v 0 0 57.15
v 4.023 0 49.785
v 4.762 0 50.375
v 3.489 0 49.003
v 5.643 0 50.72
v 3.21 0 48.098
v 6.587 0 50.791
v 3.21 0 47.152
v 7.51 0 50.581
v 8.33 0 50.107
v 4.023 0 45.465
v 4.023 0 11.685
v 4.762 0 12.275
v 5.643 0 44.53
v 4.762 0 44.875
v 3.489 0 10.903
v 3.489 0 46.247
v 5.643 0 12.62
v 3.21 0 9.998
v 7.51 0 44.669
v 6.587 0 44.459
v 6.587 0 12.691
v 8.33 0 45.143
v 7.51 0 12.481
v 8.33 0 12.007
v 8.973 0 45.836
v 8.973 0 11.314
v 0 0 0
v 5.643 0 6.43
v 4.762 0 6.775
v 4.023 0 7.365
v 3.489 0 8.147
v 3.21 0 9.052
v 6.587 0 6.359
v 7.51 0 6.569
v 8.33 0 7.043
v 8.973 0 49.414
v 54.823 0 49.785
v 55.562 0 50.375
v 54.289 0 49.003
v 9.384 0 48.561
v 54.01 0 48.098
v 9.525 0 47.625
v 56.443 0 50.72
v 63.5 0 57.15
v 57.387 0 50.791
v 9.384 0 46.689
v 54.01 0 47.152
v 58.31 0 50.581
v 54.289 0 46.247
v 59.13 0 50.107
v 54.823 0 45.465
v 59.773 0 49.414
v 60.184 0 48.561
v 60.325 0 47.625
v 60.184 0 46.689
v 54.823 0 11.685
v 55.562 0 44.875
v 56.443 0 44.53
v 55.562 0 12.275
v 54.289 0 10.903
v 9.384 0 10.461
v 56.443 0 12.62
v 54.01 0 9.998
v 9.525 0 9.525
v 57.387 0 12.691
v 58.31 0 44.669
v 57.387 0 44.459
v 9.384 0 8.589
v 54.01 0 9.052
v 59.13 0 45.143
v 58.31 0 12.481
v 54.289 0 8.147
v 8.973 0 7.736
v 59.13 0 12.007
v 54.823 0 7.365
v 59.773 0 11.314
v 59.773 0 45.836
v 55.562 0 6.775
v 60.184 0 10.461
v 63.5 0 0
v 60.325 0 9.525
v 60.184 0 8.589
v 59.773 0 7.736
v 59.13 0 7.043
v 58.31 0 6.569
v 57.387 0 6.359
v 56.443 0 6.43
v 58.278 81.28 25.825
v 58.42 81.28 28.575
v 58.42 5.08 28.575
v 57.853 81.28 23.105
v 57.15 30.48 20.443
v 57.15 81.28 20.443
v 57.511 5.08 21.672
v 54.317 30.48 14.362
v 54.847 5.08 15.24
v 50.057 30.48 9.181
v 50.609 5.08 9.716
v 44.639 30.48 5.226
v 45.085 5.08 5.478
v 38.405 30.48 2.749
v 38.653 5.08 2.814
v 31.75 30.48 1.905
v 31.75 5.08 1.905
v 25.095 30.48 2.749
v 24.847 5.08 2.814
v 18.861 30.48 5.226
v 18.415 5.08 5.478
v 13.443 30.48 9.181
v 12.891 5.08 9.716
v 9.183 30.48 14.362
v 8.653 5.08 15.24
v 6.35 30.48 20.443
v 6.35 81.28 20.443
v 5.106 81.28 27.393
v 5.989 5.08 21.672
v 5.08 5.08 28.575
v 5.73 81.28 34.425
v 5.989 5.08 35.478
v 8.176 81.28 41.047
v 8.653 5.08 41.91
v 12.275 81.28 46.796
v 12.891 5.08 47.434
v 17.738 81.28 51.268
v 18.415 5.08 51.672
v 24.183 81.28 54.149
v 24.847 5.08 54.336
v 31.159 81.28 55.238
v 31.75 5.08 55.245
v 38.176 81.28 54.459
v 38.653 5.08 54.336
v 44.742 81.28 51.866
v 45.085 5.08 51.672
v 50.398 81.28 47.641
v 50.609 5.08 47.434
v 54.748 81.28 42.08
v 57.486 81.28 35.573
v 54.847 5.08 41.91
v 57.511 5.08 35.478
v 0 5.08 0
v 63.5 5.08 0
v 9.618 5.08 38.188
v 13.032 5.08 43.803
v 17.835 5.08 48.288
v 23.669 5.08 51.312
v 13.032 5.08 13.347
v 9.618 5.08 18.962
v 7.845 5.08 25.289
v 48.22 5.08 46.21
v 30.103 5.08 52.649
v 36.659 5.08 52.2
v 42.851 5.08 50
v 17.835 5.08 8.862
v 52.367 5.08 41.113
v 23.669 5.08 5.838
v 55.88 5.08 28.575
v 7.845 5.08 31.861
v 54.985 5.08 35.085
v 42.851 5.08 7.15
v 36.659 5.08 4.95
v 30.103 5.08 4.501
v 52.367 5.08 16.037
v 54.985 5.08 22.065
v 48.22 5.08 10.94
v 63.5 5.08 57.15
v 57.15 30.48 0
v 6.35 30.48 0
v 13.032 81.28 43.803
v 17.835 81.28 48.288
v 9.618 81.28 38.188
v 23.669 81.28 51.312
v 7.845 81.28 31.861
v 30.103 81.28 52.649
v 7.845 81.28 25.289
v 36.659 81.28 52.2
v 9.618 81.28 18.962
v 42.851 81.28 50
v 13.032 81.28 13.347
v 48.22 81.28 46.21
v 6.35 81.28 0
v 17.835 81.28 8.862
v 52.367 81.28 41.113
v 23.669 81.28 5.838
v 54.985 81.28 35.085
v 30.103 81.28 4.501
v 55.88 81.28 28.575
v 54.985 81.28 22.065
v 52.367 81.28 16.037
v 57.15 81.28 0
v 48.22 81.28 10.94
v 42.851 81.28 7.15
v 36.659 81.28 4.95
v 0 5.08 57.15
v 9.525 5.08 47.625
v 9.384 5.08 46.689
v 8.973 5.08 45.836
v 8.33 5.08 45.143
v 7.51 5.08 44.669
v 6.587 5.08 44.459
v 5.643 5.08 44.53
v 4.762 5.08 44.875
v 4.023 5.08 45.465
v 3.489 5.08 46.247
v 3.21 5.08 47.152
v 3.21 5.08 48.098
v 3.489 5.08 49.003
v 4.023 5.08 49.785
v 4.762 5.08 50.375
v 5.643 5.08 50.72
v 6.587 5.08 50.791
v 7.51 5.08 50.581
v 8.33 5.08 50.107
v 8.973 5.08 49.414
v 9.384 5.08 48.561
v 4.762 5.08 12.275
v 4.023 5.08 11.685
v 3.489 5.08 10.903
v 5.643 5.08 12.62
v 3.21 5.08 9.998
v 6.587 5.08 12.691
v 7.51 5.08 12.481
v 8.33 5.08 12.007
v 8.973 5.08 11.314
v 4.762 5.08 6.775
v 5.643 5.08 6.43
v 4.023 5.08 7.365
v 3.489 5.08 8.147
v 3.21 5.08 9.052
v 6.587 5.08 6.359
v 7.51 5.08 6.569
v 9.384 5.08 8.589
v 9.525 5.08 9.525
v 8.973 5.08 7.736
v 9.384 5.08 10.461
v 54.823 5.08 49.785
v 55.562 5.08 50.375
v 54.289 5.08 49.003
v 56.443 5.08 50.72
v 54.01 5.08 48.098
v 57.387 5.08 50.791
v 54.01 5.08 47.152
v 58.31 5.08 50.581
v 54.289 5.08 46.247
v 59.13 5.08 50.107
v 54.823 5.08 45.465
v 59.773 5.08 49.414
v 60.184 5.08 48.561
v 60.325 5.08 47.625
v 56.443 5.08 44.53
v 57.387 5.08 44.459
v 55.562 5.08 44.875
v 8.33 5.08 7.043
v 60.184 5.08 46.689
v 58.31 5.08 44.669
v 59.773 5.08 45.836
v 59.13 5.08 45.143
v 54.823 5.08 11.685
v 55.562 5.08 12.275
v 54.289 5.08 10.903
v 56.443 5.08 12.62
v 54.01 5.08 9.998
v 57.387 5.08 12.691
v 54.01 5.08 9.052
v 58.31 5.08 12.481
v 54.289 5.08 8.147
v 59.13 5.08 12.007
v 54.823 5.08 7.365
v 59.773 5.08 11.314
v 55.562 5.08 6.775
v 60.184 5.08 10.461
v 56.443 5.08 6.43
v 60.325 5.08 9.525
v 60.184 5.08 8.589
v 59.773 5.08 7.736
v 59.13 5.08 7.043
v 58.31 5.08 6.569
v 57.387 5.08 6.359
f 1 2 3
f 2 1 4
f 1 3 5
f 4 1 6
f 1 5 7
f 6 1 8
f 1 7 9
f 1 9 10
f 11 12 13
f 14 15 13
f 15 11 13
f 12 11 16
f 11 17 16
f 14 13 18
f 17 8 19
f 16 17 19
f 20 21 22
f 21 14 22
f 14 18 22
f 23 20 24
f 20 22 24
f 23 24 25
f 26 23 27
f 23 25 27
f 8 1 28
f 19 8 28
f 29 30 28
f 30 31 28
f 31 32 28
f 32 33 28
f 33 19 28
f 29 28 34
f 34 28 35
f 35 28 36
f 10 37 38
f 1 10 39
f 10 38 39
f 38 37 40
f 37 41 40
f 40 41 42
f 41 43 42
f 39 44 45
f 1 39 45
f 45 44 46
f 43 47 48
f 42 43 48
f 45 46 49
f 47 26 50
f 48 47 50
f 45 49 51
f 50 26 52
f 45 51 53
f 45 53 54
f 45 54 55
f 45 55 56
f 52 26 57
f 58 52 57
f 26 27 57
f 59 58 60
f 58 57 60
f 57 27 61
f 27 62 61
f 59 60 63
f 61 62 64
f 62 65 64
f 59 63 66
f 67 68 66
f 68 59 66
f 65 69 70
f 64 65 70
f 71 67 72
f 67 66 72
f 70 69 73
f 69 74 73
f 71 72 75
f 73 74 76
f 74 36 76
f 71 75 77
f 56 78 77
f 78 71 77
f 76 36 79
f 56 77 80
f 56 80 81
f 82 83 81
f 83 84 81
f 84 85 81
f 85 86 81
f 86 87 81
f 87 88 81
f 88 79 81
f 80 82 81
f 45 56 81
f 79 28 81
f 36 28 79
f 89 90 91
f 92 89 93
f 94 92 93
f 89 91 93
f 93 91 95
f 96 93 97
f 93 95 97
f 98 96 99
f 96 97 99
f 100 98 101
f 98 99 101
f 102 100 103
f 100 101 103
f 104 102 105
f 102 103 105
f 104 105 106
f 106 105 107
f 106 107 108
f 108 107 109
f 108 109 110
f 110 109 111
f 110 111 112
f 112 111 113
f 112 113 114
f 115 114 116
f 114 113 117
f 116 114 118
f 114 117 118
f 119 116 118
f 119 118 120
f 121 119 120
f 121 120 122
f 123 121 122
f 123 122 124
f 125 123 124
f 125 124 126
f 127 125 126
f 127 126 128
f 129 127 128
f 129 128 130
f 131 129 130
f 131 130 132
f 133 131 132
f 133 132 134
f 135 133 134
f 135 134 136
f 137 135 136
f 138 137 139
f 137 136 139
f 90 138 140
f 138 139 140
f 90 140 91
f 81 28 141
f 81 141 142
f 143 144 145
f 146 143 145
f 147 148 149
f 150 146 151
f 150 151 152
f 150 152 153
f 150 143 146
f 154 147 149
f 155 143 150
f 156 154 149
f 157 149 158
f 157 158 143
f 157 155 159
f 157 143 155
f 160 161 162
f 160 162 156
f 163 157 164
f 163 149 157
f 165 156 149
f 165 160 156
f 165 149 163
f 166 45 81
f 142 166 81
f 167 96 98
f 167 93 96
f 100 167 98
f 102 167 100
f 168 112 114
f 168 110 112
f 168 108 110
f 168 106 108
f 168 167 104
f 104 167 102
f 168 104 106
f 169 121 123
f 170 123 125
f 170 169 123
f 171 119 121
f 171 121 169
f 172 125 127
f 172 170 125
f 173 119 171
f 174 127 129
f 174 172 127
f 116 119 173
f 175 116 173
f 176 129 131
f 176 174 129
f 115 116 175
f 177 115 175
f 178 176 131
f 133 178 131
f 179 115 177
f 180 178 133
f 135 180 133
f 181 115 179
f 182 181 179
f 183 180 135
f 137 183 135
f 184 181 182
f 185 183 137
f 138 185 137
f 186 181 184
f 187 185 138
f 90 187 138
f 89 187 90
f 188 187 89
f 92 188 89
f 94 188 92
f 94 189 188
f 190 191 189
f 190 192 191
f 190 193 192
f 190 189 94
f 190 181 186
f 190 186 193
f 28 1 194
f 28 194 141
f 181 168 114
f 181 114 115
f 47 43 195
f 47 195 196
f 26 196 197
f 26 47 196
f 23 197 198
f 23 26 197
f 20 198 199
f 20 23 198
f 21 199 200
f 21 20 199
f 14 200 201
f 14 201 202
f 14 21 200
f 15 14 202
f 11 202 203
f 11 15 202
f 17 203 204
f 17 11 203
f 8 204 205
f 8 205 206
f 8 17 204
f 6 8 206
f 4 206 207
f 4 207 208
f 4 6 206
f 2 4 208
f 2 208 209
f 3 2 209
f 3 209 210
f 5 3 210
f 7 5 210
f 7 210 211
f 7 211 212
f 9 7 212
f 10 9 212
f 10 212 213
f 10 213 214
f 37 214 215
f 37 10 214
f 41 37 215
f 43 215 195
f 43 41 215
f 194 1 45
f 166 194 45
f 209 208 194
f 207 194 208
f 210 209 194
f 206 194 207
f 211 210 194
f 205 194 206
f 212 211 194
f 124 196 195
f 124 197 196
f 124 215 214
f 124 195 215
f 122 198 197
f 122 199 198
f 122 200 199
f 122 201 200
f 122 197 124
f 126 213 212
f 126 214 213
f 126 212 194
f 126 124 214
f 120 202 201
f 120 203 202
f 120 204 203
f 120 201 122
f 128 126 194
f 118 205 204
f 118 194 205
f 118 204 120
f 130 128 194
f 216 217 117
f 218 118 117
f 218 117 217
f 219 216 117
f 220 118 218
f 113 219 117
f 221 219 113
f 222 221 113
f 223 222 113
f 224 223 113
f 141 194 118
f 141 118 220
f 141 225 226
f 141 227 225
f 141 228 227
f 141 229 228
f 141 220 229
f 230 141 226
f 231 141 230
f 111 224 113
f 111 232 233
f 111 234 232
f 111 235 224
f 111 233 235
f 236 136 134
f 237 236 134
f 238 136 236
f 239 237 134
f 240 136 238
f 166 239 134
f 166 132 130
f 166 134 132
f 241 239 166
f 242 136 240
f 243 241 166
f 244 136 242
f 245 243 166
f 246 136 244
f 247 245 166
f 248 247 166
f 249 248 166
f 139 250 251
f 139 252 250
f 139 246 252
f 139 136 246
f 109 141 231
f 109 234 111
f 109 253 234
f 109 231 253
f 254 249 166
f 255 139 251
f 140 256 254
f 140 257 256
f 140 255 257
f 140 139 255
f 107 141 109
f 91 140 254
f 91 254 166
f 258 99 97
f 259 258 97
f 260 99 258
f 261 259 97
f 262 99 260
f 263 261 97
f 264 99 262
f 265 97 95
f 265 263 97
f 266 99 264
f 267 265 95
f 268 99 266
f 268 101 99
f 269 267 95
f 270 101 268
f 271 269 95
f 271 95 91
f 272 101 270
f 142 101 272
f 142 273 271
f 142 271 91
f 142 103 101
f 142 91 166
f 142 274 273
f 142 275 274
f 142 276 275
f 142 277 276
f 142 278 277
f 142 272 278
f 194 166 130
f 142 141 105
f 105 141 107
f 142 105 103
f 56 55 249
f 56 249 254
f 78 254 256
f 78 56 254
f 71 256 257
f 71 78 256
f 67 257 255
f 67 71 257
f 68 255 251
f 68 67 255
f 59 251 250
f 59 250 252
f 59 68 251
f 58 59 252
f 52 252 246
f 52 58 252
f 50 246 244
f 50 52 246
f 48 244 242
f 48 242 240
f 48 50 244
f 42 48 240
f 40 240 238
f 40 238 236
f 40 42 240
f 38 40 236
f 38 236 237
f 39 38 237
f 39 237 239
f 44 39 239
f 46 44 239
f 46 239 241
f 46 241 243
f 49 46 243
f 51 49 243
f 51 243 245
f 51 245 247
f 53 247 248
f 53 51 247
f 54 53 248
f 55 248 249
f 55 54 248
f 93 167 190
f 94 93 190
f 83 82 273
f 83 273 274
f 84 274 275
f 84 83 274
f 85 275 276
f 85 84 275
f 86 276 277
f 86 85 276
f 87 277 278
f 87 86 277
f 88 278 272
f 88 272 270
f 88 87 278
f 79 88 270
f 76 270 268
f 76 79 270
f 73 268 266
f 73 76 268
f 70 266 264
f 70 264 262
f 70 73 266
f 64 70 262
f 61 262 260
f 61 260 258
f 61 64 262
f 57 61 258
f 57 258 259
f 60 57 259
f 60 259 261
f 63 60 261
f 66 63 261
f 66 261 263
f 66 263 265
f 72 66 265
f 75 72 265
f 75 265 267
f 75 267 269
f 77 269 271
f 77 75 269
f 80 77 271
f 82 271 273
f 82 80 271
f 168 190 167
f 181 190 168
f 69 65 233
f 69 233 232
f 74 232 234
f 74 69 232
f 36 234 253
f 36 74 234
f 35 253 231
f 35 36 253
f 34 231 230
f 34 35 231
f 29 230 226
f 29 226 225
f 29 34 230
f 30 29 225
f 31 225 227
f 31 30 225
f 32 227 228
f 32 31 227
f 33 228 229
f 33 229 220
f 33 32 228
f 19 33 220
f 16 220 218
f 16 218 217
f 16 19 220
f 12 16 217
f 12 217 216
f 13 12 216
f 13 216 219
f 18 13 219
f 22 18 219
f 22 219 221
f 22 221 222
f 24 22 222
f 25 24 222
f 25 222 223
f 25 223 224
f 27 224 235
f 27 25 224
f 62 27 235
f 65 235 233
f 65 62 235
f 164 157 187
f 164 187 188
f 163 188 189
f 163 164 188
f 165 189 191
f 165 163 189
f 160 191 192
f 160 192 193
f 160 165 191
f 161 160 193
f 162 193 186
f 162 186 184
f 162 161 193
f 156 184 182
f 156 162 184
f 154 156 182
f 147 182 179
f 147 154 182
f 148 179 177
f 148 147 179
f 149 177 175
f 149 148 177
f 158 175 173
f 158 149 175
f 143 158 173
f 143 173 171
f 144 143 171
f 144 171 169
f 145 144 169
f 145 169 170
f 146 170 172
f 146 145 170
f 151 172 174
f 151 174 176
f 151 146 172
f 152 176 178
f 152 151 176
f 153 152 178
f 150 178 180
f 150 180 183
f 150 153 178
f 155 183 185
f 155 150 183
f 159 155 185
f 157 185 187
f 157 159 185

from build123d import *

# Parameters (mm, degrees)
SKETCH1_W           = 63.5
SKETCH1_H           = 57.15
SKETCH1_R           = 3.175
BOSS_EXTRUDE1_DEPTH = 5.08
SKETCH2_R           = 26.67
SKETCH2_R_2         = 24.13
BOSS_EXTRUDE2_DEPTH = 76.2
BOSS_EXTRUDE3_REACH = 59.15
SKETCH4_W           = 50.8
SKETCH4_H           = 50.8


with BuildPart() as part:
    # Sketch1 → Boss-Extrude1 (new body)
    with BuildSketch(Plane(origin=(0, 0, 0), x_dir=(1, 0, 0), z_dir=(0, 1, 0))):
        with Locations((31.75, -28.575)):
            Rectangle(SKETCH1_W, SKETCH1_H)
        with Locations((6.35, -9.525)):
            Circle(SKETCH1_R, mode=Mode.SUBTRACT)
        with Locations((57.15, -9.525)):
            Circle(SKETCH1_R, mode=Mode.SUBTRACT)
        with Locations((57.15, -47.625)):
            Circle(SKETCH1_R, mode=Mode.SUBTRACT)
        with Locations((6.35, -47.625)):
            Circle(SKETCH1_R, mode=Mode.SUBTRACT)
    extrude(amount=BOSS_EXTRUDE1_DEPTH)

    # Sketch2 → Boss-Extrude2 (add)
    with BuildSketch(Plane(origin=(0, 5.08, 0), x_dir=(1, 0, 0), z_dir=(0, 1, 0))):
        with Locations((31.75, -28.575)):
            Circle(SKETCH2_R)
        with Locations((31.75, -28.575)):
            Circle(SKETCH2_R_2, mode=Mode.SUBTRACT)
    extrude(amount=BOSS_EXTRUDE2_DEPTH)

    # Sketch4 → Boss-Extrude3 (add, up to next)
    with BuildSketch(Plane(origin=(0, 0, 0), x_dir=(-1, 0, 0), z_dir=(0, 0, -1)), mode=Mode.PRIVATE) as boss_extrude3_sk1:
        with Locations((-31.75, 55.88)):
            Rectangle(SKETCH4_W, SKETCH4_H)
    boss_extrude3_tool1 = extrude(boss_extrude3_sk1.sketch, amount=-BOSS_EXTRUDE3_REACH, mode=Mode.PRIVATE) - part.part
    add(boss_extrude3_tool1.solids().sort_by_distance((31.75, 55.88, 0))[0])


solid = part.part
